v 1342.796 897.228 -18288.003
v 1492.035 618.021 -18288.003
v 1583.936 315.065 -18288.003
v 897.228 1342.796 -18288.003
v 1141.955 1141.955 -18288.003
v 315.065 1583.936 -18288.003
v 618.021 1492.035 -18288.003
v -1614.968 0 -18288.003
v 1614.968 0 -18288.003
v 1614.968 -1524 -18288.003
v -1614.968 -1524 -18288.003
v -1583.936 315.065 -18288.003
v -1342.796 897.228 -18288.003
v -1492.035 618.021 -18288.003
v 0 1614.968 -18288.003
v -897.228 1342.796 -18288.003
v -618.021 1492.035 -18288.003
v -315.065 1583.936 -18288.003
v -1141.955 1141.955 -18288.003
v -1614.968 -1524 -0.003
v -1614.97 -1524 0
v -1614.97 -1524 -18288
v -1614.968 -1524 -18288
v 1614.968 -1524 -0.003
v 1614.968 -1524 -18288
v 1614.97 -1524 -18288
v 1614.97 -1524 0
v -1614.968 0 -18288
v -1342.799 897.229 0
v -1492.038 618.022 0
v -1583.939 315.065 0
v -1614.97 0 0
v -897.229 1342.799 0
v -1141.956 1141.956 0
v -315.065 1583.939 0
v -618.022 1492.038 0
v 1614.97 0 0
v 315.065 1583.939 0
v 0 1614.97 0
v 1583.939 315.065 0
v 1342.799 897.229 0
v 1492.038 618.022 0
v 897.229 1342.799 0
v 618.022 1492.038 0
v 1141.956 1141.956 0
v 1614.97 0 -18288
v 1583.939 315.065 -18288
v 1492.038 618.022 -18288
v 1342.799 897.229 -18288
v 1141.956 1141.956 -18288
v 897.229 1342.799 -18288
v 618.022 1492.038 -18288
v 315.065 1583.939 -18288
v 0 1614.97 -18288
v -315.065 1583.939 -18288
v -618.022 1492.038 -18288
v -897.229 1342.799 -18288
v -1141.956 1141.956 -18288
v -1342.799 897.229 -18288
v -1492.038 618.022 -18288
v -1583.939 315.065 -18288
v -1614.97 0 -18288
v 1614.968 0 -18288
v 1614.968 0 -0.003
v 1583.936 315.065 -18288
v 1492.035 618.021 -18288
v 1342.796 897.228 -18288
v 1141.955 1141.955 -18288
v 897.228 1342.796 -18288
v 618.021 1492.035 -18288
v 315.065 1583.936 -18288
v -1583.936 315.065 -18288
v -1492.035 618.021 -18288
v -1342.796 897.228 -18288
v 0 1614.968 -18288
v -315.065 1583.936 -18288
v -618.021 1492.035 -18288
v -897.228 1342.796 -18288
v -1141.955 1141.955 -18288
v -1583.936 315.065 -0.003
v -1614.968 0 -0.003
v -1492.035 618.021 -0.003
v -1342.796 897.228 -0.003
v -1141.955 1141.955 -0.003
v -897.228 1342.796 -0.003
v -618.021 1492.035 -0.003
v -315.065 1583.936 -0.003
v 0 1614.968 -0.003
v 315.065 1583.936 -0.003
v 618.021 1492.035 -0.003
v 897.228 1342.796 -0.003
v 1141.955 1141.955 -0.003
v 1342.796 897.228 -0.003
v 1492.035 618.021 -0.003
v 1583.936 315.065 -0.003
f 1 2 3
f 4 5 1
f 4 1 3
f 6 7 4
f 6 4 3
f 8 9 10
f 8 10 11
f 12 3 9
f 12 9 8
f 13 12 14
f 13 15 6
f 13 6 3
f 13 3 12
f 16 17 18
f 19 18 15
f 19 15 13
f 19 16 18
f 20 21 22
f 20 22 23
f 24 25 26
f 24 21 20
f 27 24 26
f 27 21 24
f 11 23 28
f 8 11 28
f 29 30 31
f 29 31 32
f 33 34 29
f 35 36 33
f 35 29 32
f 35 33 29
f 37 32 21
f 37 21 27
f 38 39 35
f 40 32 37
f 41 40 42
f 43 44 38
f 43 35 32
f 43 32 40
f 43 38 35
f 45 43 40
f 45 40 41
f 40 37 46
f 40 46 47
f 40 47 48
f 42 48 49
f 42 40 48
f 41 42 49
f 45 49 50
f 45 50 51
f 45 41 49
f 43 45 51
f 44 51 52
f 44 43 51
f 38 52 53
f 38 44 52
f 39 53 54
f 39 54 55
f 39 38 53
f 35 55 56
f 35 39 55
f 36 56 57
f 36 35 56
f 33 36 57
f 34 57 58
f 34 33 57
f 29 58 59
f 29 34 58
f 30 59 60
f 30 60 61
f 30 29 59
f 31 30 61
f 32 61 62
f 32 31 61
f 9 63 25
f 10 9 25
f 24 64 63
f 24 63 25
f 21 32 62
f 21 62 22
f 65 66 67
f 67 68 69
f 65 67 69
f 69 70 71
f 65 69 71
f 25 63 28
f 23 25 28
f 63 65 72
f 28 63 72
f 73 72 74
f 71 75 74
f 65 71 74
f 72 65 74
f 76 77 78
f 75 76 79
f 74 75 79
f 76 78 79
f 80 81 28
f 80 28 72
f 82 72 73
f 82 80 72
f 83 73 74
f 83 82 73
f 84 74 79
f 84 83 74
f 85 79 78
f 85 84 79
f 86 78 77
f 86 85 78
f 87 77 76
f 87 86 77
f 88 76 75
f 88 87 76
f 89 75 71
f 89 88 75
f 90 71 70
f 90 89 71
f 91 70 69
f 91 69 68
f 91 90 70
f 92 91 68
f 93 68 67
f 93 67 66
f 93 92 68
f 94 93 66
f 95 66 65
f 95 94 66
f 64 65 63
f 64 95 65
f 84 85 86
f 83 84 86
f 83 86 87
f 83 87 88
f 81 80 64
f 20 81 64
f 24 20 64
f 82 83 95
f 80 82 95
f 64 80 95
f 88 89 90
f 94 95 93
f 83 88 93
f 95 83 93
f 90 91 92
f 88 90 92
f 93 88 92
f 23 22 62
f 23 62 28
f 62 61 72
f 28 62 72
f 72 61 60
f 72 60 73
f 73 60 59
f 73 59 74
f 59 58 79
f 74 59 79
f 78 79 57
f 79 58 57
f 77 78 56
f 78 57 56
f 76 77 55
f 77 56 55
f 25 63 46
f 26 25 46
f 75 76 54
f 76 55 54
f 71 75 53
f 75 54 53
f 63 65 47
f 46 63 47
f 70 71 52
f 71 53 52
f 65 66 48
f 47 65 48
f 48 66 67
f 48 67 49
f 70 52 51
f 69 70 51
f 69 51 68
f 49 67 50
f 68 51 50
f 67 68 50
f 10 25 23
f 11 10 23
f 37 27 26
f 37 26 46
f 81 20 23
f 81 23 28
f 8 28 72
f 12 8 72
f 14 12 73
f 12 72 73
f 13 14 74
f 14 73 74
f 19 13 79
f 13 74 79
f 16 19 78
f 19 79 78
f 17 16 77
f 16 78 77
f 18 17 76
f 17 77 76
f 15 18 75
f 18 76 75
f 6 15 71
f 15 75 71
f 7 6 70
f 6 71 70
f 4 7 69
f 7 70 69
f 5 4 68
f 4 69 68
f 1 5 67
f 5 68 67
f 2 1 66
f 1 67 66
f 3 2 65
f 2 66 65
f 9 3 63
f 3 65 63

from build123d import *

# Parameters (mm, degrees)
EXTRUDE_THIN1_DEPTH = 18288
BOSS_EXTRUDE5_DEPTH = 0.00254
BOSS_EXTRUDE6_DEPTH = 0.00254


with BuildPart() as part:
    # Sketch1 → Extrude-Thin1 (new body)
    with BuildSketch(Plane.XY):
        with BuildLine():
            Line((1614.9701, -1524), (1614.9701, 0))
            ThreePointArc((1614.9701, 0), (0, 1614.9701), (-1614.9701, 0))
            Line((-1614.9701, 0), (-1614.9701, -1524))
            Line((-1614.9701, -1524), (-1614.96756, -1524))
            Line((-1614.96756, -1524), (-1614.96756, 0))
            ThreePointArc((-1614.96756, 0), (0, 1614.96756), (1614.96756, 0))
            Line((1614.96756, 0), (1614.96756, -1524))
            Line((1614.96756, -1524), (1614.9701, -1524))
        make_face()
    extrude(amount=-EXTRUDE_THIN1_DEPTH)

    # Sketch2 → Boss-Extrude5 (add)
    with BuildSketch(Plane.XY):
        with BuildLine():
            Line((-1614.96756, 0), (-1614.96756, -1524))
            Line((-1614.96756, -1524), (1614.9701, -1524))
            Line((1614.9701, -1524), (1614.9701, 0))
            ThreePointArc((1614.9701, 0), (0.00127, 1614.96883), (-1614.96756, 0))
        make_face()
    extrude(amount=-BOSS_EXTRUDE5_DEPTH)


with BuildPart() as body_2:
    # Sketch3 → Boss-Extrude6 (new body)
    with BuildSketch(Plane(origin=(0, 0, -18288), x_dir=(-1, 0, 0), z_dir=(0, 0, -1))):
        with BuildLine():
            Line((-1614.96756, 0), (-1614.96756, -1524))
            Line((-1614.96756, -1524), (1614.96756, -1524))
            Line((1614.96756, -1524), (1614.96756, 0))
            ThreePointArc((1614.96756, 0), (0, 1614.96756), (-1614.96756, 0))
        make_face()
    extrude(amount=BOSS_EXTRUDE6_DEPTH)


solid = Compound([part.part, body_2.part])
